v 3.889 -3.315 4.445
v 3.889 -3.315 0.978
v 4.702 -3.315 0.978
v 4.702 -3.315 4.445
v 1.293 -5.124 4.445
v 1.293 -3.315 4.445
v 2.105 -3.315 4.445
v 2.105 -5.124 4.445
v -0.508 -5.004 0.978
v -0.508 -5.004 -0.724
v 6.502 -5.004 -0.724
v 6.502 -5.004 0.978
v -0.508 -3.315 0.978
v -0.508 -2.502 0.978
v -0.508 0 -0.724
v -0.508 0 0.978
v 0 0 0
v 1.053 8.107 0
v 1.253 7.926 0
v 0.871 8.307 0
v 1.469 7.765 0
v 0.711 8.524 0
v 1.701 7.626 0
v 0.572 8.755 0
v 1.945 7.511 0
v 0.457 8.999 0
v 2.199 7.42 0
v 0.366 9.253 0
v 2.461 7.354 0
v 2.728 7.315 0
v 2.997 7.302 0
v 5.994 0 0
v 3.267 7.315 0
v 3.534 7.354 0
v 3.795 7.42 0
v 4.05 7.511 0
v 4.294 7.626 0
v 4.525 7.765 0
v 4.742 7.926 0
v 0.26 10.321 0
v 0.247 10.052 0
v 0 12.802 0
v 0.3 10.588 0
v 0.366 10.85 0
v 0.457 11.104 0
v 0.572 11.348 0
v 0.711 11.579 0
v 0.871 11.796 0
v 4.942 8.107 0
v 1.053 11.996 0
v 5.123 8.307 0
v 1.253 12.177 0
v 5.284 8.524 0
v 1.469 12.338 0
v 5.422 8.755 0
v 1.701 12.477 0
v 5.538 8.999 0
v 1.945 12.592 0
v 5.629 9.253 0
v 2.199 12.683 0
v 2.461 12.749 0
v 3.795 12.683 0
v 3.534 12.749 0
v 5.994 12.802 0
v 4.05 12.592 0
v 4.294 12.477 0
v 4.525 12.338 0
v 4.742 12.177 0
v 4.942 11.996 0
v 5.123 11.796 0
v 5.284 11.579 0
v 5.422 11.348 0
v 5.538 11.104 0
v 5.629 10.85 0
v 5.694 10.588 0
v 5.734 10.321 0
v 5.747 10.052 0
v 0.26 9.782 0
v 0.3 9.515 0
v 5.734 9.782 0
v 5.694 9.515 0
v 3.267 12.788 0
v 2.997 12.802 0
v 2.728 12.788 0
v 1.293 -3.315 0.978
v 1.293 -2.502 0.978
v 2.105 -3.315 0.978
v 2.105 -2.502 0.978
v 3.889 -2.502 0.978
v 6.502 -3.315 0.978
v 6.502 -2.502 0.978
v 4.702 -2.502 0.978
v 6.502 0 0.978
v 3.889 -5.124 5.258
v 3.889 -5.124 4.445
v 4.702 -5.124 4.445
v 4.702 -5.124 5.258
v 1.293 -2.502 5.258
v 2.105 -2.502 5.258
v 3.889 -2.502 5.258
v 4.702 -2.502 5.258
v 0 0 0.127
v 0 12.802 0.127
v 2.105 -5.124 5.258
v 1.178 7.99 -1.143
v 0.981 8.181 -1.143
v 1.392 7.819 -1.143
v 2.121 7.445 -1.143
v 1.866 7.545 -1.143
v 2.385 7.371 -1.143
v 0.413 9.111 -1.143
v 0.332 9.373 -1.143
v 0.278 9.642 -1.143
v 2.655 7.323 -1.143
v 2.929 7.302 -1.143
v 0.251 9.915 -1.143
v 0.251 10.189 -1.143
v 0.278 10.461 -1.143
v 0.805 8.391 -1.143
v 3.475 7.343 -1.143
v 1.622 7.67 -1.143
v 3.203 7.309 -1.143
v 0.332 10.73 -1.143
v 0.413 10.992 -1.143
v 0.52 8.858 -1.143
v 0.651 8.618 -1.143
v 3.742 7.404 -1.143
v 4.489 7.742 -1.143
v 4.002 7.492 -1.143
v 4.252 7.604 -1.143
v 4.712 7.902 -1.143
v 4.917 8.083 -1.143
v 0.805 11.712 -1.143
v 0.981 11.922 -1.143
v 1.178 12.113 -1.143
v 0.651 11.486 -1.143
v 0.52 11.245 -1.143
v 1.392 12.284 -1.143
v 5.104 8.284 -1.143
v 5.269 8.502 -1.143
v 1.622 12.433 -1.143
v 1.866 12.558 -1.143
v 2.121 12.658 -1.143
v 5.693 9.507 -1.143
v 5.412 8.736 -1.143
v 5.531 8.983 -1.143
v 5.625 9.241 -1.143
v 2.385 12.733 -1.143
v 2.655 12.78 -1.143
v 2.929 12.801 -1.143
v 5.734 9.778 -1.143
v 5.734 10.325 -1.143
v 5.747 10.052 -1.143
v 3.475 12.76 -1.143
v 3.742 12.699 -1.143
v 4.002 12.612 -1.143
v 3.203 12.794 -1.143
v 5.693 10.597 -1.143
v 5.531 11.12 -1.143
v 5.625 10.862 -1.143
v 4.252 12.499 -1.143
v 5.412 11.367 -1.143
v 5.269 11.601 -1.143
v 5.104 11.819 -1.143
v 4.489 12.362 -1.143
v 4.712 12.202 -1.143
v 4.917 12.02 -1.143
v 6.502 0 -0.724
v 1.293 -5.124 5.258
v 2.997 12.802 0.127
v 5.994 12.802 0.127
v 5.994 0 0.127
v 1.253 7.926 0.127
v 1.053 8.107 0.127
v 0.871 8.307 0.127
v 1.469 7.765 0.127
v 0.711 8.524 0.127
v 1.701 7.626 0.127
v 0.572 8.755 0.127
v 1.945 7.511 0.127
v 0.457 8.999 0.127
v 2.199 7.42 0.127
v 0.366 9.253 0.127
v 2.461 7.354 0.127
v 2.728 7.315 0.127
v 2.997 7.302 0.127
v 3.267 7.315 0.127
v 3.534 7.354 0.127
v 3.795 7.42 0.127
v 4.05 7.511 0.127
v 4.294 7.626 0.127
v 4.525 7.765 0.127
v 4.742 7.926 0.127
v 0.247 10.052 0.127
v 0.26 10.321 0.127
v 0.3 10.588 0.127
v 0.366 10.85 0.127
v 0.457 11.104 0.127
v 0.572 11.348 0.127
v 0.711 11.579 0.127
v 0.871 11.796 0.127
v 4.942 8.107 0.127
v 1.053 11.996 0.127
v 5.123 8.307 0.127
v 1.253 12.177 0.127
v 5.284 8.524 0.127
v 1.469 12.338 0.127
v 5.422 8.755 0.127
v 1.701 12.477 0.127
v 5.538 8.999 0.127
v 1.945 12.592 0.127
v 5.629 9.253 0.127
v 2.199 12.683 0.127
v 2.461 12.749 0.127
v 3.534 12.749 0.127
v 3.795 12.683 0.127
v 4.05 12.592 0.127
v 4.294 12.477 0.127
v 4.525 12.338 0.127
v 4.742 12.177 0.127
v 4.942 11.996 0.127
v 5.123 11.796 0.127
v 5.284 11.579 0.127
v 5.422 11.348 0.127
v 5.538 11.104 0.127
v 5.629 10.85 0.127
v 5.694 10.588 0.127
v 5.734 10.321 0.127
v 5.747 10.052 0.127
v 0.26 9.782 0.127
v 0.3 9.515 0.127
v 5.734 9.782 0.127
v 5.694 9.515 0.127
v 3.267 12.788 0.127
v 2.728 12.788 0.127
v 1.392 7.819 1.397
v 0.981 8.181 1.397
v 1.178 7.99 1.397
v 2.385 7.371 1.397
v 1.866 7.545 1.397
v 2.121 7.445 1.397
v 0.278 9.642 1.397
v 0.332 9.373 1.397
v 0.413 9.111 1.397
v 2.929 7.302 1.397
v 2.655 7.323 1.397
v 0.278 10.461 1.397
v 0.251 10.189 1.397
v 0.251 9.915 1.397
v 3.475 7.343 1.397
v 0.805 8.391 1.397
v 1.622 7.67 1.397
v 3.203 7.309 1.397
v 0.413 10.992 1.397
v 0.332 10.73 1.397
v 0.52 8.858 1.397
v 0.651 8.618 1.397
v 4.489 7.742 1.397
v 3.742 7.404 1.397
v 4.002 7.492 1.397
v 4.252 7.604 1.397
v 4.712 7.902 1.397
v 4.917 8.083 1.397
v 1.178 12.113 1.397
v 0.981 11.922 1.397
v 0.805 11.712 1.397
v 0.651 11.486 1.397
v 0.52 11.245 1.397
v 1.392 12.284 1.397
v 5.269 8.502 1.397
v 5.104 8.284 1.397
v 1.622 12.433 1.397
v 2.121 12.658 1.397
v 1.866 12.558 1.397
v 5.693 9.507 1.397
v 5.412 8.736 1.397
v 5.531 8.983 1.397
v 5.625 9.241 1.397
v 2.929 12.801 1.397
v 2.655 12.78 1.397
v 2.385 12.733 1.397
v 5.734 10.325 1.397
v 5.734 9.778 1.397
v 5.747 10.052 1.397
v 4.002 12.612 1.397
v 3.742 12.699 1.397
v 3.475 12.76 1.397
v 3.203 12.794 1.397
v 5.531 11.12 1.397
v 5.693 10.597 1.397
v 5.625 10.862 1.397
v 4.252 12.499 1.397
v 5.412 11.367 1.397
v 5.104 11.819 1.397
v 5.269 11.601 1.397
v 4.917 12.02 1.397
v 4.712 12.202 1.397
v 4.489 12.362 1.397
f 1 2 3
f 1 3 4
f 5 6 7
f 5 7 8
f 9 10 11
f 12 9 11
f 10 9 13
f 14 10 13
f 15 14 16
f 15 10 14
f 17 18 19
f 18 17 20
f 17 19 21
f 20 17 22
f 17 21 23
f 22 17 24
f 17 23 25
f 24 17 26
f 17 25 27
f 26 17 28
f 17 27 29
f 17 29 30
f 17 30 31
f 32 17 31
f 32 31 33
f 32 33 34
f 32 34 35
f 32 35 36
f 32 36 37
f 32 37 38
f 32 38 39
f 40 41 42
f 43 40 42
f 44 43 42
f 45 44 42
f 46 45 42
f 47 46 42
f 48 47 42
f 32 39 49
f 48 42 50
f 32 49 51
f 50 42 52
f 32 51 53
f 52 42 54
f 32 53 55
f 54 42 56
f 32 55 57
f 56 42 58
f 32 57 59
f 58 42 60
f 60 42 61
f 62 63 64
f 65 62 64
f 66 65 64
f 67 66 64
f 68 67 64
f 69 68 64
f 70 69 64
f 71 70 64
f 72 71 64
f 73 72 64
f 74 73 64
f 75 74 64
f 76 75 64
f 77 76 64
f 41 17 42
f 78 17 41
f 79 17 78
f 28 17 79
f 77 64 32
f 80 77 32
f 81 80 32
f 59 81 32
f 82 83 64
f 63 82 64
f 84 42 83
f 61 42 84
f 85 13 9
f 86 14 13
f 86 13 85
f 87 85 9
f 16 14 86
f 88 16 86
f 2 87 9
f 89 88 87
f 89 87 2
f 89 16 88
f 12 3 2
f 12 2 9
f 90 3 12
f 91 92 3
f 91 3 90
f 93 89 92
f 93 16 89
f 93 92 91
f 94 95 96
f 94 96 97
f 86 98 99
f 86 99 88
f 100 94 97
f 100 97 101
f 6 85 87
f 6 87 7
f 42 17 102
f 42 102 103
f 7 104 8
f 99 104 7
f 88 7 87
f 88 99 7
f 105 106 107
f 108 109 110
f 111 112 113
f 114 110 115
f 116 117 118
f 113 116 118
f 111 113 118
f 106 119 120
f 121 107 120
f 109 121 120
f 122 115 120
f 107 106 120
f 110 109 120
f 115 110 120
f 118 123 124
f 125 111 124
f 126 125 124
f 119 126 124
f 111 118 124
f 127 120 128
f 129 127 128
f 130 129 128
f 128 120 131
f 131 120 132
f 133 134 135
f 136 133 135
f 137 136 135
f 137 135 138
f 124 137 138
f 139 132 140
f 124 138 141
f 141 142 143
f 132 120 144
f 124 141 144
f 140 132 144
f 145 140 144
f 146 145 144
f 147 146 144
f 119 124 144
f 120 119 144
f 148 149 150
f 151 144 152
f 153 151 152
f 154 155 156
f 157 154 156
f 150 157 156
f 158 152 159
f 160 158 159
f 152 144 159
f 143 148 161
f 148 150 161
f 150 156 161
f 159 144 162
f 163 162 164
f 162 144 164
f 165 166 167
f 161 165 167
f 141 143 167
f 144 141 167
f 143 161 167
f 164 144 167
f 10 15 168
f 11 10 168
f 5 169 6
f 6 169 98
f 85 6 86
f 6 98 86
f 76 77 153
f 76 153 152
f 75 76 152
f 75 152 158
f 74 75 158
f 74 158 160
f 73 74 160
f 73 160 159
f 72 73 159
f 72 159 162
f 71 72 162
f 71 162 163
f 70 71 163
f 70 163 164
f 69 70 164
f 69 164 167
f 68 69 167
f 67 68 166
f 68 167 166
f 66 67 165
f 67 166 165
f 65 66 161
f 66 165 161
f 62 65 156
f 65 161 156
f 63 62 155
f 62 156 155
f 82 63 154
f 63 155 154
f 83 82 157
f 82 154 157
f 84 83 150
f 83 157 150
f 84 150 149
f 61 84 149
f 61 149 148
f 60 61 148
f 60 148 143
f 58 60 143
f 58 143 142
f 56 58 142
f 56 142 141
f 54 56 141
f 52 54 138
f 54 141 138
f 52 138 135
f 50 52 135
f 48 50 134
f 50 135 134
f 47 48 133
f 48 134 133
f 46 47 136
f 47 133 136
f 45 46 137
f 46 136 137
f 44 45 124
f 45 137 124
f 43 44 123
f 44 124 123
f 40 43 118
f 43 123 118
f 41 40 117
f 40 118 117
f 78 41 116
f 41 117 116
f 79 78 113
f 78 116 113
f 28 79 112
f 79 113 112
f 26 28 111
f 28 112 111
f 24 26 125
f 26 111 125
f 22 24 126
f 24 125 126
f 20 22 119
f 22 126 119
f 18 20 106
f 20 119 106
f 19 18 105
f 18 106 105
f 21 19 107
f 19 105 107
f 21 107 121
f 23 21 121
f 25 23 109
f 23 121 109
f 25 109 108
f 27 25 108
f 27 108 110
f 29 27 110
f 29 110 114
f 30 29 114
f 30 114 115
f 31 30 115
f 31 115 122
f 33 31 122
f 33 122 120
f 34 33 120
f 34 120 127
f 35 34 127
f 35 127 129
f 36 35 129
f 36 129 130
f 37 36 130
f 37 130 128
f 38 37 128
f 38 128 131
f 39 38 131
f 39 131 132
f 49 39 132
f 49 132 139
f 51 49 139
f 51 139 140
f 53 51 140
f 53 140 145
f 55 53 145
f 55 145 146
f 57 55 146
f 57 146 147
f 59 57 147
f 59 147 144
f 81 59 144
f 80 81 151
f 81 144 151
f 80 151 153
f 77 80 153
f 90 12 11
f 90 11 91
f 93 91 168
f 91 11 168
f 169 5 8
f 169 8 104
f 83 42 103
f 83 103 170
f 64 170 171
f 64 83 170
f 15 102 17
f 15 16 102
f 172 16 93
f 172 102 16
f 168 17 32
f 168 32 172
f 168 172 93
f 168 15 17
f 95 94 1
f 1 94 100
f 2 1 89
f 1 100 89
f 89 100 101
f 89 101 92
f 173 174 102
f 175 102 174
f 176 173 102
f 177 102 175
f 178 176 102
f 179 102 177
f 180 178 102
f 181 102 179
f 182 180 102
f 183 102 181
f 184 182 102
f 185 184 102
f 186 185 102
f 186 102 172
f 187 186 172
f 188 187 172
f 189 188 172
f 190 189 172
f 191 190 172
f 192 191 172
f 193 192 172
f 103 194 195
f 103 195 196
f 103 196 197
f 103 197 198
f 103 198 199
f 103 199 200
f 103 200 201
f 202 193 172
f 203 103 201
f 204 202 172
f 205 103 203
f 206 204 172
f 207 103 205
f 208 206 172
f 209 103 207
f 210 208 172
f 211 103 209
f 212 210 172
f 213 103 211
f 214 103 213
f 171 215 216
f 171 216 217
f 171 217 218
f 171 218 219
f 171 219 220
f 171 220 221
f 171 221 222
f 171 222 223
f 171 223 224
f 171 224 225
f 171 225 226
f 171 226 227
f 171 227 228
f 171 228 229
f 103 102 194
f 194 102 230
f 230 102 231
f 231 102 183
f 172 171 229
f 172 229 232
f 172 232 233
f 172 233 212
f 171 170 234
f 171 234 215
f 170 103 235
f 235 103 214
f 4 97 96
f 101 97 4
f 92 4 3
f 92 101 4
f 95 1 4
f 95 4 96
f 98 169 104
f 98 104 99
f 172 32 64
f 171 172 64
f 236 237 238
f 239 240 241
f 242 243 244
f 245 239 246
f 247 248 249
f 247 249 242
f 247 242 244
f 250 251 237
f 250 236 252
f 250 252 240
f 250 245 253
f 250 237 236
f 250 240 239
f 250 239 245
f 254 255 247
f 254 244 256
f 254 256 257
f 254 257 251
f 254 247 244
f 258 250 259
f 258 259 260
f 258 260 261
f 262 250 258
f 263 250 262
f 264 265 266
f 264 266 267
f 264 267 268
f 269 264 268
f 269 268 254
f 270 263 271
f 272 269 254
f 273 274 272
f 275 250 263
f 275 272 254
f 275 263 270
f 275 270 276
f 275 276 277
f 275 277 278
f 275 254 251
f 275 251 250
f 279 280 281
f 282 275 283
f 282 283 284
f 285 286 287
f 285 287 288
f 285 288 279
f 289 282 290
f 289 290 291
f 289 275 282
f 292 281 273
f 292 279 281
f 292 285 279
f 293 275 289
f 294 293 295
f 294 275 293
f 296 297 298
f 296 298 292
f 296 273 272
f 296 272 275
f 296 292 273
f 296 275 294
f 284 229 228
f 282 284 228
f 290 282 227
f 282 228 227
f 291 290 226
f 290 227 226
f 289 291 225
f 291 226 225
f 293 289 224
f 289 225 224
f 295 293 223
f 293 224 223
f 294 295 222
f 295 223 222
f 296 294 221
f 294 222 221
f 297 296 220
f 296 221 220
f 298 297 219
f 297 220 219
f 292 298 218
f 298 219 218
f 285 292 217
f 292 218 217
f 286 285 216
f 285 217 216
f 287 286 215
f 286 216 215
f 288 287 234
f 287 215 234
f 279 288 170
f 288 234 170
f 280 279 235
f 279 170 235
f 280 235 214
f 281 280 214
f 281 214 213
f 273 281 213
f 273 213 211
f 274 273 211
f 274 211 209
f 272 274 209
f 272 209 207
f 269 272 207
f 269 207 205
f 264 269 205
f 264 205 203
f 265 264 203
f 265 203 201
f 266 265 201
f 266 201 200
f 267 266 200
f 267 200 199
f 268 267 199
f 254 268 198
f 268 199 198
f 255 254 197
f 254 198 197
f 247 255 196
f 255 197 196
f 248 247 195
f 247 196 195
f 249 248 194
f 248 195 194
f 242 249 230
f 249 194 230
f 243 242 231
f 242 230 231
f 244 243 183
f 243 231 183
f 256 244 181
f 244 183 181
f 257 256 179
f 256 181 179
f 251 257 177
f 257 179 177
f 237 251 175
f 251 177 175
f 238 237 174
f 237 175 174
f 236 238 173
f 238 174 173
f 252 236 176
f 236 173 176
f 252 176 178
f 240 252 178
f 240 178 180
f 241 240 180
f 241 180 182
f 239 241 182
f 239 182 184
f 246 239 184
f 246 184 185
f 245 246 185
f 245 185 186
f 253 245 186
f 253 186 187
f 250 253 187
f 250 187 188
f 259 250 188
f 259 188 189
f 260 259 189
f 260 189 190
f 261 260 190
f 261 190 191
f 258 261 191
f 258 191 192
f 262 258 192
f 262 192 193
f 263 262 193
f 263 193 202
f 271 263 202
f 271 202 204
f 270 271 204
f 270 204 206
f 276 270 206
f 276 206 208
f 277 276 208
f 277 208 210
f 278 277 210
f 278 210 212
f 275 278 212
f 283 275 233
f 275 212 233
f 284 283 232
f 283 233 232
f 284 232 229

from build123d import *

# Parameters (mm, degrees)
SKETCH1_W                = 5.9944
SKETCH1_H                = 12.8016
BOSS_EXTRUDE1_DEPTH      = 0.127
BOSS_EXTRUDE2_DEPTH      = 0.8509
BOSS_EXTRUDE2_DEPTH_BACK = 0.8509
SKETCH2_W                = 7.0104
SKETCH2_H                = 5.0038
BOSS_EXTRUDE3_DEPTH      = 1.27
BOSS_EXTRUDE3_DEPTH_BACK = 1.27
SKETCH3_R                = 2.75
BOSS_EXTRUDE4_DEPTH      = 7.0104
SKETCH5_W                = 1.800661627
SKETCH5_H                = 4.2799
SKETCH5_W_2              = 1.783476746
CUT_EXTRUDE1_DEPTH       = 7.0104


with BuildPart() as part:
    # Sketch1 → Boss-Extrude1 (new body)
    with BuildSketch(Plane.XY):
        with Locations((2.9972, 6.4008)):
            Rectangle(SKETCH1_W, SKETCH1_H)
    extrude(amount=BOSS_EXTRUDE1_DEPTH)

    # Sketch2 → Boss-Extrude2 (add, two sides: drawn at the far end of the back side and taken through both)
    with BuildSketch(Plane.XY.offset(0.127).offset(-BOSS_EXTRUDE2_DEPTH_BACK)):
        with Locations((2.9972, -2.5019)):
            Rectangle(SKETCH2_W, SKETCH2_H)
    extrude(amount=BOSS_EXTRUDE2_DEPTH + BOSS_EXTRUDE2_DEPTH_BACK)

    # Sketch3 → Boss-Extrude3 (add, two sides: drawn at the far end of the back side and taken through both)
    with BuildSketch(Plane.XY.offset(0.127).offset(-BOSS_EXTRUDE3_DEPTH_BACK)):
        with Locations((2.9972, 10.0516)):
            Circle(SKETCH3_R)
    extrude(amount=BOSS_EXTRUDE3_DEPTH + BOSS_EXTRUDE3_DEPTH_BACK)

    # Sketch4 → Boss-Extrude4 (add)
    with BuildSketch(Plane.ZY.offset(0.508)):
        Polygon((0.9779, -3.3147), (4.445, -3.3147), (4.445, -5.123816362), (5.2578, -5.123816362), (5.2578, -2.5019), (0.9779, -2.5019), align=None)
    extrude(amount=-BOSS_EXTRUDE4_DEPTH)

    # Sketch5 → Cut-Extrude1 (cut)
    with BuildSketch(Plane(origin=(0, -2.5019, 0), x_dir=(1, 0, 0), z_dir=(0, 1, 0))):
        with Locations((0.392330813, -3.11785)):
            Rectangle(SKETCH5_W, SKETCH5_H)
        with Locations((2.9972, -3.11785)):
            Rectangle(SKETCH5_W_2, SKETCH5_H)
        with Locations((5.602069187, -3.11785)):
            Rectangle(SKETCH5_W, SKETCH5_H)
    extrude(amount=-CUT_EXTRUDE1_DEPTH, mode=Mode.SUBTRACT)


solid = part.part
